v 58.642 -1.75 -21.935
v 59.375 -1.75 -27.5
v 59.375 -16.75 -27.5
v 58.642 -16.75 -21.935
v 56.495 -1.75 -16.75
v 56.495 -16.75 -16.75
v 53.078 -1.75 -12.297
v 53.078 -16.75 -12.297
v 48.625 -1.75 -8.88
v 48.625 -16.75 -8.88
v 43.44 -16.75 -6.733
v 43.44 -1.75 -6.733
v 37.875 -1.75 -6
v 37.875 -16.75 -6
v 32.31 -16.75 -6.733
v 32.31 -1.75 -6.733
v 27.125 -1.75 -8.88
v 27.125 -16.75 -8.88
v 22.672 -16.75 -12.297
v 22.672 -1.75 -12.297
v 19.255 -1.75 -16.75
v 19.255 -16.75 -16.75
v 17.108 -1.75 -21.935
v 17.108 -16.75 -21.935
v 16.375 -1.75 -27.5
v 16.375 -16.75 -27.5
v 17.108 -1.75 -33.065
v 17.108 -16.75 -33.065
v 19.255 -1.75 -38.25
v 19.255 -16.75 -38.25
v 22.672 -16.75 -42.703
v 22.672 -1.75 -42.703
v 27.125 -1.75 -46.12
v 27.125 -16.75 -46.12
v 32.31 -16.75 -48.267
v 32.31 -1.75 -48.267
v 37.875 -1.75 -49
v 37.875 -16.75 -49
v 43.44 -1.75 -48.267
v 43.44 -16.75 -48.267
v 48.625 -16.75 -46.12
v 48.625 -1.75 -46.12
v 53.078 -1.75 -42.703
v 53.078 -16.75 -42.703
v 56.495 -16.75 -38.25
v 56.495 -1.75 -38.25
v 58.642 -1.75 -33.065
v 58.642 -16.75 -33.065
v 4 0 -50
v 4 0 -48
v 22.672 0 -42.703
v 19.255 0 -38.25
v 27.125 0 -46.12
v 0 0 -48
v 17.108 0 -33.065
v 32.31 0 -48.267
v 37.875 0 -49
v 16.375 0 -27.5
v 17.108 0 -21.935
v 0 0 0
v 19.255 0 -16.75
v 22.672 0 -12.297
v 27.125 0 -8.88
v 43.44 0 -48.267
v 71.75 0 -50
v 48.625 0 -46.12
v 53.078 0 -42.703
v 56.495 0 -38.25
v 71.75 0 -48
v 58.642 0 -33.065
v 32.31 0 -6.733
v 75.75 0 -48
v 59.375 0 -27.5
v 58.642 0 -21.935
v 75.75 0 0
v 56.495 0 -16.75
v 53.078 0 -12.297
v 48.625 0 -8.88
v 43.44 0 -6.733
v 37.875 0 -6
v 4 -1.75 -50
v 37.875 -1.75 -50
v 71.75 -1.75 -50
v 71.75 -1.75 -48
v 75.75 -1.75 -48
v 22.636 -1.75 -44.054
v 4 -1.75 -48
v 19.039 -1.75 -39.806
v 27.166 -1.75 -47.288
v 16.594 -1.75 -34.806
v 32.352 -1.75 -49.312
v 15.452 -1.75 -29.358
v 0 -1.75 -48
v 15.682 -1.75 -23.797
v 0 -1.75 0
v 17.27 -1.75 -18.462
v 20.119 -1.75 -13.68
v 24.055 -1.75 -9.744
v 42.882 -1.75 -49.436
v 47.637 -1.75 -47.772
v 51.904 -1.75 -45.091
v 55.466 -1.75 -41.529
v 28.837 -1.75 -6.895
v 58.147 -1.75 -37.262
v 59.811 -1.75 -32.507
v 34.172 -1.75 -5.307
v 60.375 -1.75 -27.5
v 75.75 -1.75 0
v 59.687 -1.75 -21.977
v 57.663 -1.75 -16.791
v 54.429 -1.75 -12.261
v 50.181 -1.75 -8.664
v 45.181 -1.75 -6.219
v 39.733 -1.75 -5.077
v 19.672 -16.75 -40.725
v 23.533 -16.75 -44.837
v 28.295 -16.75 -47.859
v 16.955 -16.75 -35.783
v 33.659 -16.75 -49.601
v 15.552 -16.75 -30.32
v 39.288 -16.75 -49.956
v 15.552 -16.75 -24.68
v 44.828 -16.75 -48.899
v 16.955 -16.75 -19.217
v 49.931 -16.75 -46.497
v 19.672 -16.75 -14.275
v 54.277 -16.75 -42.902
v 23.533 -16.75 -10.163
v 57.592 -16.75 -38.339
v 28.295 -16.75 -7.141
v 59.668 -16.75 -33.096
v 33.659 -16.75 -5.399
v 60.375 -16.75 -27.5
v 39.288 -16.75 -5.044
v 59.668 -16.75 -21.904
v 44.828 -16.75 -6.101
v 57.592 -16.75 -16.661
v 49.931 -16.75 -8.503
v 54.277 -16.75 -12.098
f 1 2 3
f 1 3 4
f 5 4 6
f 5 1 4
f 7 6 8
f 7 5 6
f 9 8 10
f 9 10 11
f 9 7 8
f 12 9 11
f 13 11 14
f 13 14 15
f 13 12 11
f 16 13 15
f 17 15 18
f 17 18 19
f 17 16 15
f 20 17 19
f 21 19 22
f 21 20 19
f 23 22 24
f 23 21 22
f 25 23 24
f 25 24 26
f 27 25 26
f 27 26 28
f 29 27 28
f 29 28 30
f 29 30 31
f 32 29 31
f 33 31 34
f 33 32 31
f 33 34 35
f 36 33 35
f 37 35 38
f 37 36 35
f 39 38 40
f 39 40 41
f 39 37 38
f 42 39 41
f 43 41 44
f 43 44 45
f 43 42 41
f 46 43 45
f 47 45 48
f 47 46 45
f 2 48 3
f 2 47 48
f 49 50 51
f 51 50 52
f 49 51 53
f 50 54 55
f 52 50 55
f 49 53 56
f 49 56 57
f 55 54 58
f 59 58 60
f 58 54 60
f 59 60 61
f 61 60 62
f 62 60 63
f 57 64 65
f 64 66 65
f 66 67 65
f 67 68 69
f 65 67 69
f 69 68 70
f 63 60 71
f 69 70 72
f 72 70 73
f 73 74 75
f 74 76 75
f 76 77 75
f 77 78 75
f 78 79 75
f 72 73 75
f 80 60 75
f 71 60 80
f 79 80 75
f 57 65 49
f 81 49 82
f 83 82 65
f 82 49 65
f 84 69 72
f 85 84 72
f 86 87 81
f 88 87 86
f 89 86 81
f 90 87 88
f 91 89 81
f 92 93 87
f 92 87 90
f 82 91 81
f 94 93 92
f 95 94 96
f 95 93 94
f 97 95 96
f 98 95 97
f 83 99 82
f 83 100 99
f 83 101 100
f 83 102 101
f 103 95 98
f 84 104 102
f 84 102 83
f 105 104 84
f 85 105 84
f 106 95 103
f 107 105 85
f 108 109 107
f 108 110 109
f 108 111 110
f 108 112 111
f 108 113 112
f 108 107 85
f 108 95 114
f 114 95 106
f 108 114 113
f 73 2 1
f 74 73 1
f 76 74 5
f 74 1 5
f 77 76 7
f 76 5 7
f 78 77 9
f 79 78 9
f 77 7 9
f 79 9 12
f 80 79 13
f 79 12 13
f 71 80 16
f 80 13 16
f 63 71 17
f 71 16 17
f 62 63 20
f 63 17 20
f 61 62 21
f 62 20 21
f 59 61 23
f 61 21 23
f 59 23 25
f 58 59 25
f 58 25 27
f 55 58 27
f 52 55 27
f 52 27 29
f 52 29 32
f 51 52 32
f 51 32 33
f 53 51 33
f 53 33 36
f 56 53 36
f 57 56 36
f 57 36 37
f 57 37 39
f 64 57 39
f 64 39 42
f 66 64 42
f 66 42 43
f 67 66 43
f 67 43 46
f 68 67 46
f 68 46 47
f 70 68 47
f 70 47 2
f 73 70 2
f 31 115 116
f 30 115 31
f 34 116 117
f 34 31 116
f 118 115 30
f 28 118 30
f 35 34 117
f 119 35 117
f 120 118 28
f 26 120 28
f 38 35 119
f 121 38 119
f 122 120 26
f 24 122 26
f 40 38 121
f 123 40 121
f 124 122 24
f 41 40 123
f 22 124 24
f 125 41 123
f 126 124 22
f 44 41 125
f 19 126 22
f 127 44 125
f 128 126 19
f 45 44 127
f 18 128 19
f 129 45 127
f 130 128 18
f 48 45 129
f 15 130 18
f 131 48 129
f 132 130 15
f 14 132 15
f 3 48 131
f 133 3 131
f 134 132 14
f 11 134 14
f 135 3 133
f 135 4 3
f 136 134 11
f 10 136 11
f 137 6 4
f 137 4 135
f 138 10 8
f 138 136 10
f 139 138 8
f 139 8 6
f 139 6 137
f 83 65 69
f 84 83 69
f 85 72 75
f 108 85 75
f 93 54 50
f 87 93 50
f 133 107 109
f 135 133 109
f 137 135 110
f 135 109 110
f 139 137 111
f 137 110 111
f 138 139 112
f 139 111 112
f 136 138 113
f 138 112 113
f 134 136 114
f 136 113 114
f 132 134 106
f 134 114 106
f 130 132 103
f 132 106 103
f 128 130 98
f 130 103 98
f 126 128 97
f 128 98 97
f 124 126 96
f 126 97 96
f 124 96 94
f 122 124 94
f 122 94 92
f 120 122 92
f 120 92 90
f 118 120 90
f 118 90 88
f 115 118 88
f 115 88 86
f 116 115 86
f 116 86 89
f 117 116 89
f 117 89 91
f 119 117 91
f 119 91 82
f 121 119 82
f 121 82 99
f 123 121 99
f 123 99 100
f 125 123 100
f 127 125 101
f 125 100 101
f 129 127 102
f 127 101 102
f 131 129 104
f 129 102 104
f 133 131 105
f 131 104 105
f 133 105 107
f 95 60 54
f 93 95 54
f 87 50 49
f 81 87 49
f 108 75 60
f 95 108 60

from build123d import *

# Parameters (mm, degrees)
F1_DEPTH = 1.75
F2_R     = 21.5
F3_DEPTH = 25
F4_R     = 21.5
F5_DEPTH = 15


with BuildPart() as f1:
    # F0 (on Front) → F1 (new body)
    with BuildSketch(Plane.XZ):
        Polygon((75.75, 0), (0, 0), (0, -48), (4, -48), (4, -50), (71.75, -50), (71.75, -48), (75.75, -48), align=None)
    extrude(amount=F1_DEPTH)

    # F2 (on face) → F3 (cut)
    with BuildSketch(Plane.XZ.offset(1.75)):
        with Locations((37.875, -27.5)):
            Circle(F2_R)
    extrude(amount=-F3_DEPTH, mode=Mode.SUBTRACT)

    # F4 (on face) → F5 (join)
    with BuildSketch(Plane.XZ.offset(1.75)):
        with BuildLine():
            ThreePointArc((37.875, -50), (53.7849025767, -43.4099025767), (60.375, -27.5))
            ThreePointArc((60.375, -27.5), (21.9650974233, -11.5900974233), (37.875, -50))
        make_face()
        with Locations((37.875, -27.5)):
            Circle(F4_R, mode=Mode.SUBTRACT)
    extrude(amount=F5_DEPTH)


solid = f1.part
